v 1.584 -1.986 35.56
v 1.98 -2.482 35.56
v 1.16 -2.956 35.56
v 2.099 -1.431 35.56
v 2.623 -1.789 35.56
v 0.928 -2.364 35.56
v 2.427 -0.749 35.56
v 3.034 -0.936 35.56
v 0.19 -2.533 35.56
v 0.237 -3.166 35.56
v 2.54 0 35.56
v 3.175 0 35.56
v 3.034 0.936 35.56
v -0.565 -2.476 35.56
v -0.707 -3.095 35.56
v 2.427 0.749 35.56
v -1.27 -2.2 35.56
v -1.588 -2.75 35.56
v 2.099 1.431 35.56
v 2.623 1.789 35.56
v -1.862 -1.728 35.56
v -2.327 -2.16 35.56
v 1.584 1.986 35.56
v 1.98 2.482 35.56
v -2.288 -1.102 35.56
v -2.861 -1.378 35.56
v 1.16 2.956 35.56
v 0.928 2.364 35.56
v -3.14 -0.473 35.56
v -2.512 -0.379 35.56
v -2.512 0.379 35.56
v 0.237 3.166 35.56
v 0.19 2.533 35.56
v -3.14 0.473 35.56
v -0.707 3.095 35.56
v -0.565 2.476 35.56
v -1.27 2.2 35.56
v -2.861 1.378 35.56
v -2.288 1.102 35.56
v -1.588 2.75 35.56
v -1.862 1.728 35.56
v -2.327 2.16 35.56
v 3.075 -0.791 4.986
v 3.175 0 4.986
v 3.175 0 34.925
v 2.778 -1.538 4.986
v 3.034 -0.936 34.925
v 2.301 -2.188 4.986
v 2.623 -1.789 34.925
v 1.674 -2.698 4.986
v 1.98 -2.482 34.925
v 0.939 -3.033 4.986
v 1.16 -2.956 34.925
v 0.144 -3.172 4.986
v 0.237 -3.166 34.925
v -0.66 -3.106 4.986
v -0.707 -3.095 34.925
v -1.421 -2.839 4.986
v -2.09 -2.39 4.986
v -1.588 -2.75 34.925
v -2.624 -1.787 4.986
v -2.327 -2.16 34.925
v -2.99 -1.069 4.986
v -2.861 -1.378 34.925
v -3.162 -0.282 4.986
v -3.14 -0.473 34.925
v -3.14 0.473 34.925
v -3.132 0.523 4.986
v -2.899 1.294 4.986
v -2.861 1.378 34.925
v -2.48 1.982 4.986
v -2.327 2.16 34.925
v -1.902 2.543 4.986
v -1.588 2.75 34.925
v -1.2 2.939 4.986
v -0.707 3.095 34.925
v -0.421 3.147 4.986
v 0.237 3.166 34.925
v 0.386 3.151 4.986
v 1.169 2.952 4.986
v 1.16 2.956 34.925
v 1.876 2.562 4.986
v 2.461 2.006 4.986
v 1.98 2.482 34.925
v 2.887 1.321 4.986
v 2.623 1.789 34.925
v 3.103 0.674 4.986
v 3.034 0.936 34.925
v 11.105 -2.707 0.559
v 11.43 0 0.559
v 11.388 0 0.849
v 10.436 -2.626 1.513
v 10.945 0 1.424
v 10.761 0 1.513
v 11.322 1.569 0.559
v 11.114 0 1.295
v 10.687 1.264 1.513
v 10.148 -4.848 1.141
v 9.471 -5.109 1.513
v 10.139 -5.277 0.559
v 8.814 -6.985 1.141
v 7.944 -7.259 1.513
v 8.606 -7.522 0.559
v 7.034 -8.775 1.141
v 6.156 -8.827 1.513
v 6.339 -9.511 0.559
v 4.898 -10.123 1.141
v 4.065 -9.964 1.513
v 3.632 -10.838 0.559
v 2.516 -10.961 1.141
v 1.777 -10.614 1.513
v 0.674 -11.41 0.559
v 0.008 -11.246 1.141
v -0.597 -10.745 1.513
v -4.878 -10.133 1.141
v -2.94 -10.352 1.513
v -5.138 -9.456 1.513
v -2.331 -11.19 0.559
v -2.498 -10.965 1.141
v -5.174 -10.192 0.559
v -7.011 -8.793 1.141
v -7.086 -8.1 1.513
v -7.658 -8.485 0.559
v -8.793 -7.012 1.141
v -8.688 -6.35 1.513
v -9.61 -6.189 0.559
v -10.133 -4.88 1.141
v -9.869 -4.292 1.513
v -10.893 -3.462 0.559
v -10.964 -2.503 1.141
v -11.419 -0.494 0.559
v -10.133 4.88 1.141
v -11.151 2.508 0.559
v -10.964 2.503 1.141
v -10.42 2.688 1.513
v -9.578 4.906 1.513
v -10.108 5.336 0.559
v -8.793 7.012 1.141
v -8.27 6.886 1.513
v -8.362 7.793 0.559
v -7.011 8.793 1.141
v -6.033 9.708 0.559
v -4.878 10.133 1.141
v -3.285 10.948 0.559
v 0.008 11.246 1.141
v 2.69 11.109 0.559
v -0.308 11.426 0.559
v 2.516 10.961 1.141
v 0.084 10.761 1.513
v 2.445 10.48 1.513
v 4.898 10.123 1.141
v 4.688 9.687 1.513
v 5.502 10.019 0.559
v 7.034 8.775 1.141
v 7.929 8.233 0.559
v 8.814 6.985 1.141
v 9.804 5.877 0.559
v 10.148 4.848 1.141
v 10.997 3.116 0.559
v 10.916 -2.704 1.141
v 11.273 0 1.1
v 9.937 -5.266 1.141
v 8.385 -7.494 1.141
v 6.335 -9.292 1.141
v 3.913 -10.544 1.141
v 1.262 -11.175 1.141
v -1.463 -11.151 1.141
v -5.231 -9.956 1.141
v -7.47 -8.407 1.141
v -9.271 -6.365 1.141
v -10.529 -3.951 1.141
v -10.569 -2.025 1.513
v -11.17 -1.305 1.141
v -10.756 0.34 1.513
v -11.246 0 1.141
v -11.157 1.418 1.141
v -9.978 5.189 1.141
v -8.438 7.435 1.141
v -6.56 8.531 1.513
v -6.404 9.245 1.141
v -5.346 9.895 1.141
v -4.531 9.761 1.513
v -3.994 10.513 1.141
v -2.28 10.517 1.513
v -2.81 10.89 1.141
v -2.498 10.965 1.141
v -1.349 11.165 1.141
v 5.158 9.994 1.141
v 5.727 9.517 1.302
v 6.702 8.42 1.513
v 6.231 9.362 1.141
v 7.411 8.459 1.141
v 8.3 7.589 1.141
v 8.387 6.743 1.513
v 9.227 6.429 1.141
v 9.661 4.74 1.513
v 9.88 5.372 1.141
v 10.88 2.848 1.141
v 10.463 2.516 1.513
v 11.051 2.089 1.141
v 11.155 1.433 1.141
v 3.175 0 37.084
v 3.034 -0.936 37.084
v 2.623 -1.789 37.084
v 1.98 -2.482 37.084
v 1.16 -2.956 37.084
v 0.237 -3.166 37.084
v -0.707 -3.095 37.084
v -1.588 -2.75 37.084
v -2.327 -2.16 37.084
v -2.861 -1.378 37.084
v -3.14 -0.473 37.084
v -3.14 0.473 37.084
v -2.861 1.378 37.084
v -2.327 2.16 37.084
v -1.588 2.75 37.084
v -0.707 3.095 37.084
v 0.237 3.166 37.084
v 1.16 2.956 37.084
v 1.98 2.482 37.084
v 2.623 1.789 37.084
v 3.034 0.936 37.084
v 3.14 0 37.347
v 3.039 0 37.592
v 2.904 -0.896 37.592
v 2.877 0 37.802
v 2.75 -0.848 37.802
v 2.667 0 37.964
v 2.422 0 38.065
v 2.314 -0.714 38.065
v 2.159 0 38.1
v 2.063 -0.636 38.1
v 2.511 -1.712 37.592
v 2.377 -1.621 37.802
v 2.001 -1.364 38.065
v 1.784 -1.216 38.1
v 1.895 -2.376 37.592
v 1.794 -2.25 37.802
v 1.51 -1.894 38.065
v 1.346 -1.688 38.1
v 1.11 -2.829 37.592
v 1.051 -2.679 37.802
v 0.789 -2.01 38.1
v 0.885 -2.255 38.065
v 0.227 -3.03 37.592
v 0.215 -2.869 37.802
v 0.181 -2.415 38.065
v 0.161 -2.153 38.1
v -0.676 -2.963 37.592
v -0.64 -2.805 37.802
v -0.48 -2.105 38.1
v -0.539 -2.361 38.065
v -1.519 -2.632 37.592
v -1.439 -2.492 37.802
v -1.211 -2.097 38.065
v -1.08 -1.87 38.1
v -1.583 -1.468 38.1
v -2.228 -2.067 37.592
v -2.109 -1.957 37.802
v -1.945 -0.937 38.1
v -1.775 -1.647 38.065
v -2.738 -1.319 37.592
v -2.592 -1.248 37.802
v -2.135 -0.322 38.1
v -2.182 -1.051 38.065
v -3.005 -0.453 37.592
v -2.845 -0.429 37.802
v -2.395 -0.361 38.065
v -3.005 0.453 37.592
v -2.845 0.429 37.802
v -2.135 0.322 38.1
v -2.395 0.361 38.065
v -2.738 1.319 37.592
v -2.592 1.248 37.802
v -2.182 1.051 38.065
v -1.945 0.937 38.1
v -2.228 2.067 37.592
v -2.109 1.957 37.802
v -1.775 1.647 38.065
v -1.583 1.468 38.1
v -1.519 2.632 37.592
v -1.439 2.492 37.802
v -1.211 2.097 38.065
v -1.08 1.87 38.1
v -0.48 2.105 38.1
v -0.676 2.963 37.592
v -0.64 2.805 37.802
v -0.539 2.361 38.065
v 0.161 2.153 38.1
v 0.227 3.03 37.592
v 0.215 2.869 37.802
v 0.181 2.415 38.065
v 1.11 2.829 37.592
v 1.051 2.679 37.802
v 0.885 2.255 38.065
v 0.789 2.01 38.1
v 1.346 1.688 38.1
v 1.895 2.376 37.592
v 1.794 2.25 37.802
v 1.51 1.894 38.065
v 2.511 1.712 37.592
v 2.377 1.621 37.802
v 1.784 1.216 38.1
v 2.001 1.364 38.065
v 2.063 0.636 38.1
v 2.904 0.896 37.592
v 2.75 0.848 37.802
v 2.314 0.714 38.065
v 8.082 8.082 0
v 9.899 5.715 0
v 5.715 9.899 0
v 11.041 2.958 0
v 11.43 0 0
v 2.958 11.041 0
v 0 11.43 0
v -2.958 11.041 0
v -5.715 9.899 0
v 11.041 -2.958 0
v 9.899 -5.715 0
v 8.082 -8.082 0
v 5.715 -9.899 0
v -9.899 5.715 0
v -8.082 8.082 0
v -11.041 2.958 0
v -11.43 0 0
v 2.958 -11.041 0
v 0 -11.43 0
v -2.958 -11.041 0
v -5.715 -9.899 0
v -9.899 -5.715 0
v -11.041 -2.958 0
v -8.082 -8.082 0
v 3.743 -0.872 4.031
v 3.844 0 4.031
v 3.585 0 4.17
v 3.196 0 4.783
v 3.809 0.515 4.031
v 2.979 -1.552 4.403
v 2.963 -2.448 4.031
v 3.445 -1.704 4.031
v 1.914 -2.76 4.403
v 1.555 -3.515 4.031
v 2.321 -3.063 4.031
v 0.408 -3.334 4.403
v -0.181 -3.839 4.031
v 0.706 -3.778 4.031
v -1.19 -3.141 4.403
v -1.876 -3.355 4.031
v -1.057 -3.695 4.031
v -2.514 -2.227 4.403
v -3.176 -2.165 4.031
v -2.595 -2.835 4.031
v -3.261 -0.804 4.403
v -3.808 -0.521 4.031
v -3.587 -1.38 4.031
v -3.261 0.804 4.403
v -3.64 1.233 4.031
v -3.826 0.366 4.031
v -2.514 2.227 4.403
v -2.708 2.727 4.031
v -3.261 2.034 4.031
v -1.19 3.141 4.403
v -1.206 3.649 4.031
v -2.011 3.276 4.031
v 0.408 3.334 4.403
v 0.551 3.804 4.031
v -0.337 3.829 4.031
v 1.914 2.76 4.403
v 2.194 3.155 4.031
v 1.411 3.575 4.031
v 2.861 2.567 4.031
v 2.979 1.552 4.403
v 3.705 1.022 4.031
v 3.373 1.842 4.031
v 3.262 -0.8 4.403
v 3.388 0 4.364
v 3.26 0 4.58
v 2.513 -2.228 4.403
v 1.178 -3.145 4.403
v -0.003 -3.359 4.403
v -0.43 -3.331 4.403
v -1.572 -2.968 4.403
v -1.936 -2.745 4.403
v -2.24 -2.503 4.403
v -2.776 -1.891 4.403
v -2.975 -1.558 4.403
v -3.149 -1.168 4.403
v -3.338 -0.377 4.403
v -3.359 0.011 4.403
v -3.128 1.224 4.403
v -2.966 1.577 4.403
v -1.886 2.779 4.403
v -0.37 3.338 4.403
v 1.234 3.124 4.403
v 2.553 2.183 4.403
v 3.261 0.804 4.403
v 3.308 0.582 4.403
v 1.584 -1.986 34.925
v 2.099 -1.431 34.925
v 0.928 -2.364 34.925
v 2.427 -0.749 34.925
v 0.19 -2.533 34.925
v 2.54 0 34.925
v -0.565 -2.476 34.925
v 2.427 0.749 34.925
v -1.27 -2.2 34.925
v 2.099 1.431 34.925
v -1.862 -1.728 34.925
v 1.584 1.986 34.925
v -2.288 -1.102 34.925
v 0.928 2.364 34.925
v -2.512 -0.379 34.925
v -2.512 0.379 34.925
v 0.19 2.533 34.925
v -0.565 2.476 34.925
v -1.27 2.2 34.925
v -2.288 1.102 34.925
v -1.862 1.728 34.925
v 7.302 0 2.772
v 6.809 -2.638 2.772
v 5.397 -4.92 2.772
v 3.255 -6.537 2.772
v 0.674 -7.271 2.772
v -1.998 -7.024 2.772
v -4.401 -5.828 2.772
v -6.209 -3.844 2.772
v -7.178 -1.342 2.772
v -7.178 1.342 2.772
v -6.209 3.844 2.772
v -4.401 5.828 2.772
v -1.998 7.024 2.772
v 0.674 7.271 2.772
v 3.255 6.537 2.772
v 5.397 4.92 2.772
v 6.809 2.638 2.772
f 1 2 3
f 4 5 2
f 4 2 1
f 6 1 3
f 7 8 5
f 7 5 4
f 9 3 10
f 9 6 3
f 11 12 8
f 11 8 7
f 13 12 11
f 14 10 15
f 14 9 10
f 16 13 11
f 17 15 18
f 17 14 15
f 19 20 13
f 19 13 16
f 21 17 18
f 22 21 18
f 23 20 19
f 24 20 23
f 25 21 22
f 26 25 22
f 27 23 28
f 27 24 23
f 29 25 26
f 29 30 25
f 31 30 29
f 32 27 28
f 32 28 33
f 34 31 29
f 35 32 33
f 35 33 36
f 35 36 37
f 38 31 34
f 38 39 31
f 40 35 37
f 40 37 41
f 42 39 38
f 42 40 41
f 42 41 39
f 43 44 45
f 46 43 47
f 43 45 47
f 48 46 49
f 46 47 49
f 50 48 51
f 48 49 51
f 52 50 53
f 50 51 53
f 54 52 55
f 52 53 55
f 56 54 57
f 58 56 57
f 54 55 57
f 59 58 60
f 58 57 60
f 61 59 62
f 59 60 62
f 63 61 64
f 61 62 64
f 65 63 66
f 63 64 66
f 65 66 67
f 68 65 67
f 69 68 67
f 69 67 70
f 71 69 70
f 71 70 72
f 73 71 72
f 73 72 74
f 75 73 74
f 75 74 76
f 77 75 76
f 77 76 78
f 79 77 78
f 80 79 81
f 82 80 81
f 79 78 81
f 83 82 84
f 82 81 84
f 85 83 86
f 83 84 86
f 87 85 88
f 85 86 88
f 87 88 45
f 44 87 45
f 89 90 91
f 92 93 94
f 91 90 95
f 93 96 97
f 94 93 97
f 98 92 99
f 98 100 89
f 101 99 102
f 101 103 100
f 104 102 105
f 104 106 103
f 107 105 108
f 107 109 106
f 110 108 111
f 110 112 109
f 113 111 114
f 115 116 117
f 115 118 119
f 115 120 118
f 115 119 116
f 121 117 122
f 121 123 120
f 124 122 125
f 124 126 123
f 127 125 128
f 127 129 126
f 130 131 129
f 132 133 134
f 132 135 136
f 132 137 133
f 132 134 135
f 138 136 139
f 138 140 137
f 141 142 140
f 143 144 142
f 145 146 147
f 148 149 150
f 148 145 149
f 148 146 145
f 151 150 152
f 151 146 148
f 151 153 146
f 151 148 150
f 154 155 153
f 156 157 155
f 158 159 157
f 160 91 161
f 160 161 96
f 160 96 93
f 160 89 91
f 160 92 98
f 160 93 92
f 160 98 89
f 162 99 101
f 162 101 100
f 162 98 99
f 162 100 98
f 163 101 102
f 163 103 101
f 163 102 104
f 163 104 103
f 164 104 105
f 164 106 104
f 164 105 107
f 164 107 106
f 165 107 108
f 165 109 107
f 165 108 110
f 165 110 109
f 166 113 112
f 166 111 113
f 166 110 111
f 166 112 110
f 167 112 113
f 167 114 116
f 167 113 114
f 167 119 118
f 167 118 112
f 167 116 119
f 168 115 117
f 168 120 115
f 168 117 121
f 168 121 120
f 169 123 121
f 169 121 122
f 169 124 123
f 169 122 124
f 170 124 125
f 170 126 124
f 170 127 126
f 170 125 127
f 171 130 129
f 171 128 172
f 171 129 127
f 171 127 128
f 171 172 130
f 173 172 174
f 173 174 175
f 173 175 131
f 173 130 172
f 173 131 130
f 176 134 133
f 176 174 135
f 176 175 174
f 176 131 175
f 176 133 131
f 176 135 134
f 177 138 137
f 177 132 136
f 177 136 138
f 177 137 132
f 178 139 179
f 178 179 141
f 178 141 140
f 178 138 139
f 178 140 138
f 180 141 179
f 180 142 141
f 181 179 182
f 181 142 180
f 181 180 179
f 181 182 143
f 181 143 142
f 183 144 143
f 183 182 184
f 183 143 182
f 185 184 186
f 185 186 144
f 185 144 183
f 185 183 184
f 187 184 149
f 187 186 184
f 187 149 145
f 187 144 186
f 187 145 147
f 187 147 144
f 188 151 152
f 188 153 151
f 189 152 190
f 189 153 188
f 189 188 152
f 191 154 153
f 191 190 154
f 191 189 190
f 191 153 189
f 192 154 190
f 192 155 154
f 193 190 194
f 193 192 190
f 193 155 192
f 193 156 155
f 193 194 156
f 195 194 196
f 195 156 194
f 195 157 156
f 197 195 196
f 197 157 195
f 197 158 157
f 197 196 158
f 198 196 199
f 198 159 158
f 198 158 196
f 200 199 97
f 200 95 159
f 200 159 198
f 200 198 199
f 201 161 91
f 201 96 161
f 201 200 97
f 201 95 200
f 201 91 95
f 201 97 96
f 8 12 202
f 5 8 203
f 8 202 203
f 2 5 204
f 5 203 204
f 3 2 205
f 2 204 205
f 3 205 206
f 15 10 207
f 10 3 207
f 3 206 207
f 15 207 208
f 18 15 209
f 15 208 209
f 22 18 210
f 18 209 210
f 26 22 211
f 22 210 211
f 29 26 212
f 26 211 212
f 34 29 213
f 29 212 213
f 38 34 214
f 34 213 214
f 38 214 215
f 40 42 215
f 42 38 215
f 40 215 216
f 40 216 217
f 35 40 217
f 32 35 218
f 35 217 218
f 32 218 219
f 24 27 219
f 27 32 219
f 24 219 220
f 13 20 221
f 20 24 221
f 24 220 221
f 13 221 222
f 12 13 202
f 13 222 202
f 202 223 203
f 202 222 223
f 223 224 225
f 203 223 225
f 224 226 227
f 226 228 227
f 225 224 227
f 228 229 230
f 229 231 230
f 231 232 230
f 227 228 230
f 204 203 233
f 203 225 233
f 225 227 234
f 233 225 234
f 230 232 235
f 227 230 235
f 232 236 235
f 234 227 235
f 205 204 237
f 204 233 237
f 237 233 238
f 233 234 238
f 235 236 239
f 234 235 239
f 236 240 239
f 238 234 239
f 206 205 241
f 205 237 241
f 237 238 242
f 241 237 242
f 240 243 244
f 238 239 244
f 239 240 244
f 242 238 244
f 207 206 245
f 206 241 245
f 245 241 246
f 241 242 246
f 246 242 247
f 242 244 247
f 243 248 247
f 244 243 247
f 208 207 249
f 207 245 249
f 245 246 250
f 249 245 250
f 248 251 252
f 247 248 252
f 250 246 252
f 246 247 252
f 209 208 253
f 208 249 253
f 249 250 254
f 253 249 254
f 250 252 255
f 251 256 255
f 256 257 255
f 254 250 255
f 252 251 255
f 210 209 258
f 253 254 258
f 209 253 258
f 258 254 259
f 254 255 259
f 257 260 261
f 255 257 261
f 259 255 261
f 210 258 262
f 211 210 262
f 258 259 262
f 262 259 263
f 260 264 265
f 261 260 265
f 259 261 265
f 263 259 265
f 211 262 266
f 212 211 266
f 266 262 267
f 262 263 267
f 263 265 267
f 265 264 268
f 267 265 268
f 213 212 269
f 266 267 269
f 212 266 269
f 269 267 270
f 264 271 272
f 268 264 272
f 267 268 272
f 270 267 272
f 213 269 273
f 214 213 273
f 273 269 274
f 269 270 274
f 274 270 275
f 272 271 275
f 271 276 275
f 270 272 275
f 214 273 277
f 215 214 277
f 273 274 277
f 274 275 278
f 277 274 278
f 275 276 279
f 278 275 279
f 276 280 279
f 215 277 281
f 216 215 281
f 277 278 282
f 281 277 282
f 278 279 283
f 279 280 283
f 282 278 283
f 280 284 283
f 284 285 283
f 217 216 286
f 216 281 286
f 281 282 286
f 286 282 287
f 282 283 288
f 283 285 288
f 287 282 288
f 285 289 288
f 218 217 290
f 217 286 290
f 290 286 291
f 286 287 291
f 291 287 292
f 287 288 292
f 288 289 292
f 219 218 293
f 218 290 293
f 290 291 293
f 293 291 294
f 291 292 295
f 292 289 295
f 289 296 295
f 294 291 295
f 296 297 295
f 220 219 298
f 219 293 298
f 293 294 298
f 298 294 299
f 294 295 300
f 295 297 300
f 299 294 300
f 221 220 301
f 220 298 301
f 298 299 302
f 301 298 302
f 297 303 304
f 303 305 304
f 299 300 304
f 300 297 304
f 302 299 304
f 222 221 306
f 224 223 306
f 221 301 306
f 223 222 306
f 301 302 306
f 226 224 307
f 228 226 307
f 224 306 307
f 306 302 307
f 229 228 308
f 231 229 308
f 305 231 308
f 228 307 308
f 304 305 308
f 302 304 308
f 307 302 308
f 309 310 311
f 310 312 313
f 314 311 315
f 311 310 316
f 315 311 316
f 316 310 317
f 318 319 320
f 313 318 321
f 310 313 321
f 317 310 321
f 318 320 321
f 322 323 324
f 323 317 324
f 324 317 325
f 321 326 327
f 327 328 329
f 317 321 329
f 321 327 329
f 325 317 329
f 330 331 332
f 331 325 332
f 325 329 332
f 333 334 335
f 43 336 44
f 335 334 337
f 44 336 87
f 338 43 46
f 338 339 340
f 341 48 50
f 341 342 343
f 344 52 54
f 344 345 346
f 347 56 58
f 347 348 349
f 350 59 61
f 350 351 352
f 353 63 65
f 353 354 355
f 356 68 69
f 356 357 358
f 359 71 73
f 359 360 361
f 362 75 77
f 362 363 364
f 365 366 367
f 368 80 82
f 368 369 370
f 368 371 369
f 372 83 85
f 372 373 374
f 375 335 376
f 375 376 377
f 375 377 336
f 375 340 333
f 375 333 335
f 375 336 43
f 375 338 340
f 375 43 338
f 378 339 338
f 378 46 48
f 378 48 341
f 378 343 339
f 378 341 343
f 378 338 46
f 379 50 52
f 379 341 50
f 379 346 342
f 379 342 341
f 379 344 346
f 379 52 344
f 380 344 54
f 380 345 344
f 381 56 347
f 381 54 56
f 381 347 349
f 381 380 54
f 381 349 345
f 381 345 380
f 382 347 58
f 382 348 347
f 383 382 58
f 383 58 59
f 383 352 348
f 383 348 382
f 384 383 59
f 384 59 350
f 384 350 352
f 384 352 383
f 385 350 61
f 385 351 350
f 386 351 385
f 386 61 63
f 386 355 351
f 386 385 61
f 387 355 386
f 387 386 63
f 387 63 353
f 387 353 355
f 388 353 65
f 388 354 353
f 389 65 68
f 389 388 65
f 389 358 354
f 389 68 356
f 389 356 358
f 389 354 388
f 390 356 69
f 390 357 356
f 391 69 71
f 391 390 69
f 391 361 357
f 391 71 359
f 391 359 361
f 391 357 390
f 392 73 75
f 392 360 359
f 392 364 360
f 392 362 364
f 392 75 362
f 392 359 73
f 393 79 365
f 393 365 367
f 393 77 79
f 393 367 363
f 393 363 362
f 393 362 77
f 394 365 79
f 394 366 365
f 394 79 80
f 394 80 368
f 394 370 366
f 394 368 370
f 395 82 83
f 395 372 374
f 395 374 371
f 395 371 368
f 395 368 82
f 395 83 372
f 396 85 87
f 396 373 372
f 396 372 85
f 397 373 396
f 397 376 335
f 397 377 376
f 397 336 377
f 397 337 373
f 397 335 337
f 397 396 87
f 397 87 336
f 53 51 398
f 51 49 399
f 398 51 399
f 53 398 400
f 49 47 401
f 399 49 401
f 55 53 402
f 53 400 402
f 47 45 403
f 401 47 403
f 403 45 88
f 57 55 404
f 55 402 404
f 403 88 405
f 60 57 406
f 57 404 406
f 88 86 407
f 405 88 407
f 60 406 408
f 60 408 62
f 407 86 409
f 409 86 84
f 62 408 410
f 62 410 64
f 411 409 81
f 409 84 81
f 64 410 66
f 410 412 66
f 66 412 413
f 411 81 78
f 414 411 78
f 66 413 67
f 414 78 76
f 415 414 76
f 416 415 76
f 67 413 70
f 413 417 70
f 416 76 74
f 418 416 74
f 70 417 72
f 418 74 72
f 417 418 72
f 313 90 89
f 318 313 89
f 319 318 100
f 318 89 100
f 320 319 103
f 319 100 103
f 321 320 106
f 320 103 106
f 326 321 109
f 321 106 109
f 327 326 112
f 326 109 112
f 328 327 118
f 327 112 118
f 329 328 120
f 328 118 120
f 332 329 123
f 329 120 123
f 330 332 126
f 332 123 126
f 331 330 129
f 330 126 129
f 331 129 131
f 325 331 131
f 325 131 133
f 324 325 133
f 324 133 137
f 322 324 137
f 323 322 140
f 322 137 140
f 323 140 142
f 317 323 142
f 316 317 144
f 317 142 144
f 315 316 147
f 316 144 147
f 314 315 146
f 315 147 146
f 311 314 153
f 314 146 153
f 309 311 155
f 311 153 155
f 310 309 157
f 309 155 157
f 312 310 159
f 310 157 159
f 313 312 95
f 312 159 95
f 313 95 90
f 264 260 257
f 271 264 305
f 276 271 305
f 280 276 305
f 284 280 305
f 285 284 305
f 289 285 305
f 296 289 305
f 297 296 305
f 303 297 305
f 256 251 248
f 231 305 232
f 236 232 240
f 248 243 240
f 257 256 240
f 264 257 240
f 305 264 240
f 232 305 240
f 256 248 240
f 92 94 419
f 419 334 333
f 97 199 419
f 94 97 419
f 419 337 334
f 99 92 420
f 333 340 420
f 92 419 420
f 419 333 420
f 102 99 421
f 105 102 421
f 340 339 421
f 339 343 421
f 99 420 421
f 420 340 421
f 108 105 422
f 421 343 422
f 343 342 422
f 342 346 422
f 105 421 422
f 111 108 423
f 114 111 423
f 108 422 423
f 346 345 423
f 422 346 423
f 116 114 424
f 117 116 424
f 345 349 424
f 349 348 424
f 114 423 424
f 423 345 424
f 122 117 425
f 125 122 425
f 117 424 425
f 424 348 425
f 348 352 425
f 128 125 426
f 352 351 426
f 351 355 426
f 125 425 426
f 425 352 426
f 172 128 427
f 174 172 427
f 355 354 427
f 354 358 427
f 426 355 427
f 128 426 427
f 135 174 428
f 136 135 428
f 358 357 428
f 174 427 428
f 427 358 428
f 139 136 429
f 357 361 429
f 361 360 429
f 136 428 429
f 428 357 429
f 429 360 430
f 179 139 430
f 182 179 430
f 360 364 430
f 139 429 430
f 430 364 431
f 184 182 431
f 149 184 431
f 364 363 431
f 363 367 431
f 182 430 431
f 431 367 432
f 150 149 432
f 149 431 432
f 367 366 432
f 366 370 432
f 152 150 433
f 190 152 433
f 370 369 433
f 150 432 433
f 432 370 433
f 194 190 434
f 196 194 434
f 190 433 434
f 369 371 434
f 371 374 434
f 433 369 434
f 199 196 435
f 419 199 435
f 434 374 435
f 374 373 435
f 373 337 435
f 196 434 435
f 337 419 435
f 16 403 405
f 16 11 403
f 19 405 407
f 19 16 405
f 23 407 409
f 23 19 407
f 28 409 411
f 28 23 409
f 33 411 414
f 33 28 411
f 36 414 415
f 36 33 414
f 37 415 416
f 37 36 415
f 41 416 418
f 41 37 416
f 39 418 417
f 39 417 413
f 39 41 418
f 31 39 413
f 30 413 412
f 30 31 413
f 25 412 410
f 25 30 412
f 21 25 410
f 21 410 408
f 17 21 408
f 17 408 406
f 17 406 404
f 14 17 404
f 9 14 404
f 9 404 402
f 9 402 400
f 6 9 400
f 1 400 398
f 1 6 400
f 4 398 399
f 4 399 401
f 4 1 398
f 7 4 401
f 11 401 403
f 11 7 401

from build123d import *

# Parameters (mm, degrees)
F2_R = 1.016
F3_W = 0.635
F3_H = 0.635
F5_R = 1.016


with BuildPart() as f1:
    # F0 (on Front) → F1 (revolve)
    with BuildSketch(Plane.XZ):
        Polygon((0, 38.1), (0, 0), (11.43, 0), (11.43, 1.27), (3.175, 4.274574), (3.175, 38.1), align=None)
    revolve(axis=Axis((0, 0, 19.05), (0, 0, -1)))

    # F2
    f2_edges = [f1.edges().sort_by_distance(p)[0] for p in [
        (-11.43, 0, 1.27),
        (-3.175, 0, 4.274574),
    ]]
    fillet(f2_edges, radius=F2_R)

    # F3 (on Front) → F4 (revolve, cut)
    with BuildSketch(Plane.XZ):
        with Locations((2.8575, 35.2425)):
            Rectangle(F3_W, F3_H)
    revolve(axis=Axis((0, 0, 4.274574), (0, 0, 1)), mode=Mode.SUBTRACT)

    # F5
    f5_edges = [f1.edges().sort_by_distance(p)[0] for p in [
        (-3.175, 0, 38.1),
    ]]
    fillet(f5_edges, radius=F5_R)


solid = f1.part
